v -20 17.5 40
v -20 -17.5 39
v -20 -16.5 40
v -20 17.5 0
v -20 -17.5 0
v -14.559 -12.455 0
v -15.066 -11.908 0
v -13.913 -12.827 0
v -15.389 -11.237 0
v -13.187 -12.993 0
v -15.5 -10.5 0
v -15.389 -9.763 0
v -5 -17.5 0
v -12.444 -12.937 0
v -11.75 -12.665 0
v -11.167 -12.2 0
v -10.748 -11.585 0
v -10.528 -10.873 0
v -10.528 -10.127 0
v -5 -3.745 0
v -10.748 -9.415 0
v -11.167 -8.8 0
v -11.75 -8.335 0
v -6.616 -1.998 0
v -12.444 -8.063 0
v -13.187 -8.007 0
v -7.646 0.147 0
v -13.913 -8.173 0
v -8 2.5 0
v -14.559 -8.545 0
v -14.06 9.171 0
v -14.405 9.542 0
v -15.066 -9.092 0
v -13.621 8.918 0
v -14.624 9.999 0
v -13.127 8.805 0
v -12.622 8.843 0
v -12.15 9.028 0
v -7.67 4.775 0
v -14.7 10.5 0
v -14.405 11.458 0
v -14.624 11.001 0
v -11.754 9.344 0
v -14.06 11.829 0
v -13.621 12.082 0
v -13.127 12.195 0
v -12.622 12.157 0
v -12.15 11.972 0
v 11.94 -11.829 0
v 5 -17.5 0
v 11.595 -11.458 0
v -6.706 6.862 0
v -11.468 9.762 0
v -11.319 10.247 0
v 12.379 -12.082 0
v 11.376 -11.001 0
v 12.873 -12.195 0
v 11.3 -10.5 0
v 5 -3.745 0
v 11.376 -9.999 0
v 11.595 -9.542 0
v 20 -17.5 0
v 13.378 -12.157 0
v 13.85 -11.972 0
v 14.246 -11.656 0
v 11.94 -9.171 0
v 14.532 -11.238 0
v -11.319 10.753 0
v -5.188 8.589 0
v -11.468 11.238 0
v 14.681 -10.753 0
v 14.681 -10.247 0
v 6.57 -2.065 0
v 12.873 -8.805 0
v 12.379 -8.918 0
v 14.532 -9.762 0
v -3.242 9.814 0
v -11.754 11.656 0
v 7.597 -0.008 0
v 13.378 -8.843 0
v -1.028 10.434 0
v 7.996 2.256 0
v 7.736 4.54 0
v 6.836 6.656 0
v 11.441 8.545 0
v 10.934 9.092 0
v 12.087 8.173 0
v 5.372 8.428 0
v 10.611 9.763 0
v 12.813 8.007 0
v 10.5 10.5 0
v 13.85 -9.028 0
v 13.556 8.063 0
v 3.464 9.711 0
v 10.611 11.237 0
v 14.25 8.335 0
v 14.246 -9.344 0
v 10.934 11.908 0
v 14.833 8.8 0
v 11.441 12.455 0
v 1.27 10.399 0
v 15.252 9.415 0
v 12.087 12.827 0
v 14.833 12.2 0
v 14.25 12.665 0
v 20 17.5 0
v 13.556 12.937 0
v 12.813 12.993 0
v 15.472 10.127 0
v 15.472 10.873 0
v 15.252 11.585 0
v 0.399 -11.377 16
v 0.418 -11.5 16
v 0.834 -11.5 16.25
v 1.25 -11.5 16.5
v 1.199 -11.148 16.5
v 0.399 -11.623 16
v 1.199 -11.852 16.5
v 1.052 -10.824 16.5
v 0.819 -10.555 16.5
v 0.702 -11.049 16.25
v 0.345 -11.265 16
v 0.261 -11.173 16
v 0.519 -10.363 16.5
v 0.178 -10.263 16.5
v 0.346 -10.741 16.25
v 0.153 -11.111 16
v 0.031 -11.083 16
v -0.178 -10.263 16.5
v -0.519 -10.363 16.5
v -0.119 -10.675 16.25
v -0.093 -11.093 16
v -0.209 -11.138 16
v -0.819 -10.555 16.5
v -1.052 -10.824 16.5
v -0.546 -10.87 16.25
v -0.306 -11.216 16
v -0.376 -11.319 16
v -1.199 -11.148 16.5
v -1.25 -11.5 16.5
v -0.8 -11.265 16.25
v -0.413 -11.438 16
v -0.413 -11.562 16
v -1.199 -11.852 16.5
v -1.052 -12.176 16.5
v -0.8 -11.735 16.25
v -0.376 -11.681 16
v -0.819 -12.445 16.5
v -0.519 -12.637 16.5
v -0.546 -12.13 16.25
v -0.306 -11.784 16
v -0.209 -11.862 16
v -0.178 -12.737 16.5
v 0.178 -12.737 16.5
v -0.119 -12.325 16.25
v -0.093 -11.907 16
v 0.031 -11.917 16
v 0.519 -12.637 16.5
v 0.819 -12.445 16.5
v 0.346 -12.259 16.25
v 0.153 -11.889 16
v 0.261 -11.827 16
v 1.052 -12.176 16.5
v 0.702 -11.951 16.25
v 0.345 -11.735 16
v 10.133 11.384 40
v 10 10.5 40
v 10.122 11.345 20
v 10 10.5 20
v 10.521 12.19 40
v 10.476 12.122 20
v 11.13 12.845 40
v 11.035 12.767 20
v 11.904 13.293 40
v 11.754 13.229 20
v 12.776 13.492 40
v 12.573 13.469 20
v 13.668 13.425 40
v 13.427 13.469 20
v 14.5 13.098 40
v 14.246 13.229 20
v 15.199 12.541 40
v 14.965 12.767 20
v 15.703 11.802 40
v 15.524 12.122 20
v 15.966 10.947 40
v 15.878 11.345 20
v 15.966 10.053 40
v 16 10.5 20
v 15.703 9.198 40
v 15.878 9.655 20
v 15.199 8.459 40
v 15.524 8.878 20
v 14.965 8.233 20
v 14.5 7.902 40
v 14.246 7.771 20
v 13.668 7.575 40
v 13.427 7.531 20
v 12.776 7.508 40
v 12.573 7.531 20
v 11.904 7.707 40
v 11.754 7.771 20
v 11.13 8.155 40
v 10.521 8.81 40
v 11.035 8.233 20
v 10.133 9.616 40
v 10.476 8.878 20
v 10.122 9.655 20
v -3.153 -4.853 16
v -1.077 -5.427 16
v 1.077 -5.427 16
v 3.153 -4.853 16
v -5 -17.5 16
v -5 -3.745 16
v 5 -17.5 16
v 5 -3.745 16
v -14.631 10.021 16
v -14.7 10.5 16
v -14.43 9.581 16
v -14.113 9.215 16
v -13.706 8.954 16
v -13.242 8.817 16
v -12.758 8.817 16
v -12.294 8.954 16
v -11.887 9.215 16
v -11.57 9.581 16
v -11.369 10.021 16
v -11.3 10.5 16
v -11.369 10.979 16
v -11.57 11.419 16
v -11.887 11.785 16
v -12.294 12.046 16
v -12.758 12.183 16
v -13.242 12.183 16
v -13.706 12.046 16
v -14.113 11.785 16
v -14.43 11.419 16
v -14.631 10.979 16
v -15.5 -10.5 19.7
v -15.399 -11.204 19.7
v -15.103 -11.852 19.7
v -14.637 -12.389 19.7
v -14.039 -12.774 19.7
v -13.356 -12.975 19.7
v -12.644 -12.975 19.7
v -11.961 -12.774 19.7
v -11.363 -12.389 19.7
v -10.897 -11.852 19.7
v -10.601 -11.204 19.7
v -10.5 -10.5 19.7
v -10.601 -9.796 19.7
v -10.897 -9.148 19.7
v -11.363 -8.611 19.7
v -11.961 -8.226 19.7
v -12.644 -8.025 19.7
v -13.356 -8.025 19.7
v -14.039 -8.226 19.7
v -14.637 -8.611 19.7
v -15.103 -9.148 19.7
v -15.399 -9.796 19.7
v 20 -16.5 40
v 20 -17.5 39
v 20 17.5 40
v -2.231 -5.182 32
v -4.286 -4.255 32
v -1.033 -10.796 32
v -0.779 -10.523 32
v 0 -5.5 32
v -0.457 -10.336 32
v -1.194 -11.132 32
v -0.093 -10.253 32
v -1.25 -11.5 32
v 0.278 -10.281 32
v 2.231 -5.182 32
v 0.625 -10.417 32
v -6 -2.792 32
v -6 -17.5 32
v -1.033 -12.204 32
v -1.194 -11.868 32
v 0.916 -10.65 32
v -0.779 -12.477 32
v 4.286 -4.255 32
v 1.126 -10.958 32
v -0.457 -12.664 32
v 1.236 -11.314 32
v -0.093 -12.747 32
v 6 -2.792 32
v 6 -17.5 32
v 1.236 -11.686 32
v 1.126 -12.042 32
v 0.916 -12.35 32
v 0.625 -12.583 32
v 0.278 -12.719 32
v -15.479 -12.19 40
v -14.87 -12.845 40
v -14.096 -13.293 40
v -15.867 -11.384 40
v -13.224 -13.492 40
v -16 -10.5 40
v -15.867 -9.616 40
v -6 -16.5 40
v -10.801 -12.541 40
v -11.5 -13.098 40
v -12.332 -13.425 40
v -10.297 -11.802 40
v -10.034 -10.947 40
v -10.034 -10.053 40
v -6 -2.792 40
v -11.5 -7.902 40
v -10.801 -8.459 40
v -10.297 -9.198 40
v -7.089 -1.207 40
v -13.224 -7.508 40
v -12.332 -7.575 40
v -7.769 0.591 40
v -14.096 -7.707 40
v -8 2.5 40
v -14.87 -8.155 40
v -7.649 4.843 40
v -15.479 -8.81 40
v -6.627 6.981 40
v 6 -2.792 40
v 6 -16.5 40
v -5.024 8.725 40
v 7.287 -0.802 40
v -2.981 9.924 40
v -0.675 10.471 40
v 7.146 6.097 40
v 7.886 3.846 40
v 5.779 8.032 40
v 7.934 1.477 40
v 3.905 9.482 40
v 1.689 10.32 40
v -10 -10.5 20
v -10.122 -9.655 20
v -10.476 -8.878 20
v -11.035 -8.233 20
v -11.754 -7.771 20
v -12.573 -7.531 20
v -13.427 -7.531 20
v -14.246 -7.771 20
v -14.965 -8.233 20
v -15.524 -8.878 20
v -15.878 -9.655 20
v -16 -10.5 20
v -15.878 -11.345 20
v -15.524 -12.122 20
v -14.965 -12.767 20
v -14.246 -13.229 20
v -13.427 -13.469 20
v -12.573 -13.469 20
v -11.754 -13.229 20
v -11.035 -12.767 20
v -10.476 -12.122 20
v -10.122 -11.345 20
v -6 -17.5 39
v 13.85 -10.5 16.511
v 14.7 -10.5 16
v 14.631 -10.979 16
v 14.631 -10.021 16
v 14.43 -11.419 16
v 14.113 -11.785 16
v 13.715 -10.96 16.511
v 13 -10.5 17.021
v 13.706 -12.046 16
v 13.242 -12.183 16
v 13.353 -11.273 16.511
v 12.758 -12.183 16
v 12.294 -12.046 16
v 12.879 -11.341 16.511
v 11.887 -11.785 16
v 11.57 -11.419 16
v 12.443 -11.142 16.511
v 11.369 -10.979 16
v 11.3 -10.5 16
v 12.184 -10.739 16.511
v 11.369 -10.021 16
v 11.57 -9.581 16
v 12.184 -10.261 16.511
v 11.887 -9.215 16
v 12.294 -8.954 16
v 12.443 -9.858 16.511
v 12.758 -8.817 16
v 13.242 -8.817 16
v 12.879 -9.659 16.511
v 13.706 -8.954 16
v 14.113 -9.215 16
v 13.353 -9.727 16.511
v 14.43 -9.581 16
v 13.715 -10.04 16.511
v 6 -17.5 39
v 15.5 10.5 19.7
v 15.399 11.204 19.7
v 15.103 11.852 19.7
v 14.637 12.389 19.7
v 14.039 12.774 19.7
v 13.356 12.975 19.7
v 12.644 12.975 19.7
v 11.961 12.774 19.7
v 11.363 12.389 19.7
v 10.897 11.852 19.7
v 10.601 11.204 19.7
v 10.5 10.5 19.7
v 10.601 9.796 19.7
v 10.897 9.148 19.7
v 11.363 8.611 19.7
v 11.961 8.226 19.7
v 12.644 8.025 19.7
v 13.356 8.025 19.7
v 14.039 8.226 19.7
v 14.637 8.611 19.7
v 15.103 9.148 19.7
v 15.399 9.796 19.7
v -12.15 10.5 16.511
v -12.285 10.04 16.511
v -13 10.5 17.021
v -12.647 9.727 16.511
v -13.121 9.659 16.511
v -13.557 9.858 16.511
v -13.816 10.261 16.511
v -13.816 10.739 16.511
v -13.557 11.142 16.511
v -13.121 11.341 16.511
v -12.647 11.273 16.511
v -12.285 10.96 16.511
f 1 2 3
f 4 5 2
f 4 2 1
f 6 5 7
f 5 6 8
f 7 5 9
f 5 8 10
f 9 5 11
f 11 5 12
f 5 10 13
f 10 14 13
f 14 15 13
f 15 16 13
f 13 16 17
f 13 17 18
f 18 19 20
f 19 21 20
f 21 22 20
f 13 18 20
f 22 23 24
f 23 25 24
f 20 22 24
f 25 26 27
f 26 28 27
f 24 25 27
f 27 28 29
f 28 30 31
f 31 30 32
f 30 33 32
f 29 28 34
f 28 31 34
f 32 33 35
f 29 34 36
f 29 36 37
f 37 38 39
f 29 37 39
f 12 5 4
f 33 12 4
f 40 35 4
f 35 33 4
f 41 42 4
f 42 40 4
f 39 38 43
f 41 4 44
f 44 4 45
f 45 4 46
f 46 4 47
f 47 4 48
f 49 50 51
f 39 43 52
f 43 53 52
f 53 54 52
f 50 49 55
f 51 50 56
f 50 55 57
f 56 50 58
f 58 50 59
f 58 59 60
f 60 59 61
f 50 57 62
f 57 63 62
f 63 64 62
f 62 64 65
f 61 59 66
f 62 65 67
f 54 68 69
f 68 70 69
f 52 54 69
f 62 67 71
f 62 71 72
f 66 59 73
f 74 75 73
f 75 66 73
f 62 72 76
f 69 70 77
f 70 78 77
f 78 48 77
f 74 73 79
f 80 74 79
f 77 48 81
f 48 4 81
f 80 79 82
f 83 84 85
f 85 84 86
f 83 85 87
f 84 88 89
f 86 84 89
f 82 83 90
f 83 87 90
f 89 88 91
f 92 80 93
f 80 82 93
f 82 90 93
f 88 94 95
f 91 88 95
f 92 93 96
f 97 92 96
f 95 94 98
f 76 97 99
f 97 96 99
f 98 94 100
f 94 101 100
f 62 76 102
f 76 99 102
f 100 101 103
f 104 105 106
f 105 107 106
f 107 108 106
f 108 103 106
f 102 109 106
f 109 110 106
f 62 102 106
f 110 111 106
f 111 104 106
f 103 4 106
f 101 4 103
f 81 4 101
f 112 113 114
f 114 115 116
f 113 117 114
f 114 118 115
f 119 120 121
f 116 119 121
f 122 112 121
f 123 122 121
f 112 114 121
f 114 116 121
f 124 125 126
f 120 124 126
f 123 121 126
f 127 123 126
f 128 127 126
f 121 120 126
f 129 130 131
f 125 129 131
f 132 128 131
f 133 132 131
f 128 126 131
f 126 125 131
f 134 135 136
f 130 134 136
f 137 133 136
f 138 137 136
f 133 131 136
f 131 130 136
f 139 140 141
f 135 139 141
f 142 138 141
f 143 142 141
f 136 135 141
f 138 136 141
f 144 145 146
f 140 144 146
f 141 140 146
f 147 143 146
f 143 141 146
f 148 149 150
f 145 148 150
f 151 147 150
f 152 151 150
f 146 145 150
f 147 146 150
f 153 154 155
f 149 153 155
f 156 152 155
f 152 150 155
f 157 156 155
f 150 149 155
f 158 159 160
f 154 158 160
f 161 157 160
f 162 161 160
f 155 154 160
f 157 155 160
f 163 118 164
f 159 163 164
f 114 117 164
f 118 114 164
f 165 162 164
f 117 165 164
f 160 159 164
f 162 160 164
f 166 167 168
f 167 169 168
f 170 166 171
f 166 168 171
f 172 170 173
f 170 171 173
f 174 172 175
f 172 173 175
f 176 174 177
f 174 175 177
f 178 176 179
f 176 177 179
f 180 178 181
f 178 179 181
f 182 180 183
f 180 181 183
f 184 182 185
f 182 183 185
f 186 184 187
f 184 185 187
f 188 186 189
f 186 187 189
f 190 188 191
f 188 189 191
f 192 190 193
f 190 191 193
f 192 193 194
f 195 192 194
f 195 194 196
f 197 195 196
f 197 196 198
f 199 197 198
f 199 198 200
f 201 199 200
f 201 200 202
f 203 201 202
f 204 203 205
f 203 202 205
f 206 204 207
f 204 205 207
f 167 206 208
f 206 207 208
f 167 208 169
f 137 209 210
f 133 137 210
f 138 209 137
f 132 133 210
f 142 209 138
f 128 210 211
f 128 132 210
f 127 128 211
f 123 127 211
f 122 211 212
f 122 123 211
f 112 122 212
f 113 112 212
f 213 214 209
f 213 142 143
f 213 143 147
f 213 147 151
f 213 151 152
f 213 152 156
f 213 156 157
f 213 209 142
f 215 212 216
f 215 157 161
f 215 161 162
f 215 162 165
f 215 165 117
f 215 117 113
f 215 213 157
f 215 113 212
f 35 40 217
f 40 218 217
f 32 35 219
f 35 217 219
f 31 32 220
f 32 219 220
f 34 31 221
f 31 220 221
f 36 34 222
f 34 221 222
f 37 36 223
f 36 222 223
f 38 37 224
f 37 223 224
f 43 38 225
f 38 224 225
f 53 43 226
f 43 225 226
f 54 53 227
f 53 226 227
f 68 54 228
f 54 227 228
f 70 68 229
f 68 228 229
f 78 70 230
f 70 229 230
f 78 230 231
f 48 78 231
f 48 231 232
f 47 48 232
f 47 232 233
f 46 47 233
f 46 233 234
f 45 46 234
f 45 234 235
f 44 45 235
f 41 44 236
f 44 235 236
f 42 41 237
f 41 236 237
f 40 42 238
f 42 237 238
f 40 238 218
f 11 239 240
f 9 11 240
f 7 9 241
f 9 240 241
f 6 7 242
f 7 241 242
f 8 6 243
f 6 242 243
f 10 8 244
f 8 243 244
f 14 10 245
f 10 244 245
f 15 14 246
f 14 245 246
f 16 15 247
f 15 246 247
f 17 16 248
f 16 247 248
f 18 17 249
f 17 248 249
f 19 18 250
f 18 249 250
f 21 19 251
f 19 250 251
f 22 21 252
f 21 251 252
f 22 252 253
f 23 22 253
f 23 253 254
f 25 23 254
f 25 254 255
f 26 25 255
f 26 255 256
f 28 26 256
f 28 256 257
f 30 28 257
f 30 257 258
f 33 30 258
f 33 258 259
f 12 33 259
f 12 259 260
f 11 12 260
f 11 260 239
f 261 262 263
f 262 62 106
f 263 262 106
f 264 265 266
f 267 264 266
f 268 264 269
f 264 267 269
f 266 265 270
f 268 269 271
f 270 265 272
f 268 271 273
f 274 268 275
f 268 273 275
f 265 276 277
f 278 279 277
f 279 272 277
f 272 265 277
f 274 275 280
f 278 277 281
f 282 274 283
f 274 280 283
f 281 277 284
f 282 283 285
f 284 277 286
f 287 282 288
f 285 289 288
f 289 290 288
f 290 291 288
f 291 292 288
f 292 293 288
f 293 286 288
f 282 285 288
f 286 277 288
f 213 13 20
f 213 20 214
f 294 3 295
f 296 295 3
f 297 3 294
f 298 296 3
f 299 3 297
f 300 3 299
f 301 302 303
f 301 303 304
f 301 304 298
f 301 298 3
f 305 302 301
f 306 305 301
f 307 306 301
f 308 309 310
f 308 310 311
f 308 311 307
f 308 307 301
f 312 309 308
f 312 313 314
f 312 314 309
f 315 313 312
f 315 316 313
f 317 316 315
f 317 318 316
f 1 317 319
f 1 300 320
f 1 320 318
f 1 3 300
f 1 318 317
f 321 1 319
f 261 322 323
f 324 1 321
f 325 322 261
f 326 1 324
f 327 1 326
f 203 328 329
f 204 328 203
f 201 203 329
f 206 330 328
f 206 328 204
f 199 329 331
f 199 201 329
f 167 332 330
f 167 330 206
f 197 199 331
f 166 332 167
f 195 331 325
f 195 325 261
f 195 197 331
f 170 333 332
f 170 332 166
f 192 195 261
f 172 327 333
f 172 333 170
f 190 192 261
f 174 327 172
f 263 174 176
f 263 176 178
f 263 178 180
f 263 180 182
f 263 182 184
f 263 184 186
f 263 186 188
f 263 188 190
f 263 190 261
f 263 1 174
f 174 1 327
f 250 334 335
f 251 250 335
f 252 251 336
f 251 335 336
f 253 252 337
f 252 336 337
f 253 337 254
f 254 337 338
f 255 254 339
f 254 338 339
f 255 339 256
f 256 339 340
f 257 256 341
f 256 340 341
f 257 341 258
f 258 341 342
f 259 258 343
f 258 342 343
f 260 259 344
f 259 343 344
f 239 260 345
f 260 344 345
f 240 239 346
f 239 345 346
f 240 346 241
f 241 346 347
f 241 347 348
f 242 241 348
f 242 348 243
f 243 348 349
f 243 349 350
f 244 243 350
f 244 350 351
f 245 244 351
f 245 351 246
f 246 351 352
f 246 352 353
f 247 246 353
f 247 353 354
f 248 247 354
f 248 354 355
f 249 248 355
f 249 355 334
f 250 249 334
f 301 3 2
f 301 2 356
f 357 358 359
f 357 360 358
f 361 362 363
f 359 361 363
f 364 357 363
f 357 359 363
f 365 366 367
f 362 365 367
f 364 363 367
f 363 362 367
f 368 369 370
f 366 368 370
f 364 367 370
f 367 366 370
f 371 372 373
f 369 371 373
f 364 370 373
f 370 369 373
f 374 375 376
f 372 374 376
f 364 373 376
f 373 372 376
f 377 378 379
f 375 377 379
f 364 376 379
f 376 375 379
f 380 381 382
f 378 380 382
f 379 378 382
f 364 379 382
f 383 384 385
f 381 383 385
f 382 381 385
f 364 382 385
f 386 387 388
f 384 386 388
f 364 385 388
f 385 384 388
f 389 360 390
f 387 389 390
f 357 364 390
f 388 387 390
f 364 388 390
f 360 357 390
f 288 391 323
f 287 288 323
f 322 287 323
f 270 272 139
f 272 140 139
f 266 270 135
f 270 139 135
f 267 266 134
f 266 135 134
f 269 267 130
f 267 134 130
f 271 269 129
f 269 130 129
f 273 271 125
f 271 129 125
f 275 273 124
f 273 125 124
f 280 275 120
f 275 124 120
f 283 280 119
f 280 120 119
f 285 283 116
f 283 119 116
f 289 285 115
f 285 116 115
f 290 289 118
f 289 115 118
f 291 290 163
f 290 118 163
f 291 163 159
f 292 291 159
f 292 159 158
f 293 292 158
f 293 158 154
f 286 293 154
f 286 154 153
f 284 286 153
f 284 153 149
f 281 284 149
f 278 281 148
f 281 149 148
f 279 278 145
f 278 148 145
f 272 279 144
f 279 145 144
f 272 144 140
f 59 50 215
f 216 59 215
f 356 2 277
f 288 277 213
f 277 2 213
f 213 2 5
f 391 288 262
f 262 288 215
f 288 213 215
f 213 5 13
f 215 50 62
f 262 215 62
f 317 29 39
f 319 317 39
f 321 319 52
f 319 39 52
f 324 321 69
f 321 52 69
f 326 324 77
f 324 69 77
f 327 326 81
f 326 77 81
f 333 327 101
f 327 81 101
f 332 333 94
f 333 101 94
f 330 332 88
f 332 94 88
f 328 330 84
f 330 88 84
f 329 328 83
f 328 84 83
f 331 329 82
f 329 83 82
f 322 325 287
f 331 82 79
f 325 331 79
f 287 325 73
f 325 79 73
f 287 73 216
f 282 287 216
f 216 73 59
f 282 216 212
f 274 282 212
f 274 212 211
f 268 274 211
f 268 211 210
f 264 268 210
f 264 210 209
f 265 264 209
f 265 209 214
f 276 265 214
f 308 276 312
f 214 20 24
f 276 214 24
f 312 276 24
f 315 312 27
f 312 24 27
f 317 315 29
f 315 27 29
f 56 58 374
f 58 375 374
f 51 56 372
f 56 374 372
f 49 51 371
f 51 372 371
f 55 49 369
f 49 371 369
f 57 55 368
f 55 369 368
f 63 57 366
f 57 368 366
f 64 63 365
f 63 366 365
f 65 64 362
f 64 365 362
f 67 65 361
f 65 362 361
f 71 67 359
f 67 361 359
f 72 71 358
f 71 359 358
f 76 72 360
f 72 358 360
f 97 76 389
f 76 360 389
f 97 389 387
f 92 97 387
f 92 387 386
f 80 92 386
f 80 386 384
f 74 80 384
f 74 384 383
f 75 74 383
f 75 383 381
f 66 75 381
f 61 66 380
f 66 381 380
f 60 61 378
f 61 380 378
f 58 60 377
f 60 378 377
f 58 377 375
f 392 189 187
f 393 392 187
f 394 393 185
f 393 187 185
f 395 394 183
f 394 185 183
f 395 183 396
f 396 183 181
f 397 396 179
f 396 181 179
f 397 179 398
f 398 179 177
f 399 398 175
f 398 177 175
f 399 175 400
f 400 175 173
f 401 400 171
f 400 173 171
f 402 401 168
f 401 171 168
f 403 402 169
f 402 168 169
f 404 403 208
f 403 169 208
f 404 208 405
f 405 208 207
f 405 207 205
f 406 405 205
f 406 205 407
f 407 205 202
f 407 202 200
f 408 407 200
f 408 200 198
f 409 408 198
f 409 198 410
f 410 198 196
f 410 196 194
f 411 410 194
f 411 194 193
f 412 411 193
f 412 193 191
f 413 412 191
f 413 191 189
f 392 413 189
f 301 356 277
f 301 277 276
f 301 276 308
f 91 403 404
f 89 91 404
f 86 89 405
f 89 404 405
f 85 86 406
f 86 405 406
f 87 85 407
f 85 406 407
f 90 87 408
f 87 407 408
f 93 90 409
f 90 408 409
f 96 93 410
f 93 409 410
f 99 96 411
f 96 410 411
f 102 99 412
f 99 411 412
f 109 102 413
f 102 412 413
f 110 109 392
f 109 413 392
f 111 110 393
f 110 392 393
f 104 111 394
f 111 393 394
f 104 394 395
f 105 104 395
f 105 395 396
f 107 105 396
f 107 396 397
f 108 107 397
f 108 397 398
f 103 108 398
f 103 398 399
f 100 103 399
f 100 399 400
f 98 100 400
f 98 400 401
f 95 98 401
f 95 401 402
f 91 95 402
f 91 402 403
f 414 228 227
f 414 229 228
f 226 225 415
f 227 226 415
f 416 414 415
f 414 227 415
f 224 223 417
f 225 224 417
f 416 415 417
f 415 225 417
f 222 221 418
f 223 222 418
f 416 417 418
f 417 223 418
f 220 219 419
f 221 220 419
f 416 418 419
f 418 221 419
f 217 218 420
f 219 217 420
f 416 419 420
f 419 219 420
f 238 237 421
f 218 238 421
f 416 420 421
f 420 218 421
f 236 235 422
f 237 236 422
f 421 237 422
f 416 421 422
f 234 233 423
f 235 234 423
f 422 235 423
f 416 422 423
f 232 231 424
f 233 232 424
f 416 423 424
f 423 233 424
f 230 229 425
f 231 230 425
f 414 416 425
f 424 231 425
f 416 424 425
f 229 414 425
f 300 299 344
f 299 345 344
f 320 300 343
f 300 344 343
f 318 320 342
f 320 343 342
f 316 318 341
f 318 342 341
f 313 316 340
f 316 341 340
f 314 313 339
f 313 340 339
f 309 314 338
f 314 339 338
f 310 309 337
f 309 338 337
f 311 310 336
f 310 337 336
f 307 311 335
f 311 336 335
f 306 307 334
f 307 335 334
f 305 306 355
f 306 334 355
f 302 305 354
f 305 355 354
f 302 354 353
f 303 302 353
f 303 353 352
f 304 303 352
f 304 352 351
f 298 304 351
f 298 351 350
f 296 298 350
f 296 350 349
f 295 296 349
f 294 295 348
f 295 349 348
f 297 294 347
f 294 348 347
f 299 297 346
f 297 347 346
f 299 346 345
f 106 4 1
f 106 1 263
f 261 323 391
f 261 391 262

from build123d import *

# Parameters (mm, degrees)
F0_W      = 40
F0_H      = 35
F1_DEPTH  = 40
F2_SIZE   = 1
F5_D      = 16
F6_W      = 12
F6_H      = 8
F7_DEPTH  = 25
F8_W      = 10
F8_H      = 16
F9_DEPTH  = 13.7560020016
F11_D     = 6
F11_DEPTH = 20
F11_TIP   = 1.8025818571
F13_D     = 3.4
F13_DEPTH = 16
F13_TIP   = 1.0214630523
F15_D     = 5
F15_DEPTH = 21
F15_TIP   = 1.5021515476
F17_D     = 2.5
F17_DEPTH = 15.5
F17_TIP   = 0.7510757738


with BuildPart() as f1:
    # F0 (on Top) → F1 (new body)
    with BuildSketch(Plane.XY):
        Rectangle(F0_W, F0_H)
    extrude(amount=F1_DEPTH)

    # F2
    f2_edges = [f1.edges().sort_by_distance(p)[0] for p in [
        (0, -17.5, 40),
    ]]
    chamfer(f2_edges, length=F2_SIZE)

    # F5 (through all)
    with Locations(Plane.XY.offset(40)):
        with Locations((0, 2.5)):
            Hole(F5_D / 2)

    # F6 (on face) → F7 (cut)
    with BuildSketch(Plane.XZ.offset(17.5)):
        with Locations((0, 36)):
            Rectangle(F6_W, F6_H)
    extrude(amount=-F7_DEPTH, mode=Mode.SUBTRACT)

    # F8 (on face) → F9 (cut, through all)
    with BuildSketch(Plane.XZ.offset(17.5)):
        with Locations((0, 8)):
            Rectangle(F8_W, F8_H)
    extrude(amount=-F9_DEPTH, mode=Mode.SUBTRACT)

    # F11
    with Locations(Plane.XY.offset(40)):
        with Locations((13, 10.5), (-13, -10.5)):
            Hole(F11_D / 2, depth=F11_DEPTH)
            with Locations((0, 0, -(F11_DEPTH + F11_TIP / 2))):  # 118° drill point
                Cone(0, F11_D / 2, F11_TIP, mode=Mode.SUBTRACT)

    # F13
    with Locations(Plane(origin=(0, 0, 0), x_dir=(1, 0, 0), z_dir=(0, 0, -1))):
        with Locations((-13, -10.5), (13, 10.5)):
            Hole(F13_D / 2, depth=F13_DEPTH)
            with Locations((0, 0, -(F13_DEPTH + F13_TIP / 2))):  # 118° drill point
                Cone(0, F13_D / 2, F13_TIP, mode=Mode.SUBTRACT)

    # F15
    with Locations(Plane(origin=(0, 0, 0), x_dir=(1, 0, 0), z_dir=(0, 0, -1))):
        with Locations((-13, 10.5), (13, -10.5)):
            Hole(F15_D / 2, depth=F15_DEPTH)
            with Locations((0, 0, -(F15_DEPTH + F15_TIP / 2))):  # 118° drill point
                Cone(0, F15_D / 2, F15_TIP, mode=Mode.SUBTRACT)

    # F17
    with Locations(Plane.XY.offset(32)):
        with Locations((0, -11.5)):
            Hole(F17_D / 2, depth=F17_DEPTH)
            with Locations((0, 0, -(F17_DEPTH + F17_TIP / 2))):  # 118° drill point
                Cone(0, F17_D / 2, F17_TIP, mode=Mode.SUBTRACT)


solid = f1.part
